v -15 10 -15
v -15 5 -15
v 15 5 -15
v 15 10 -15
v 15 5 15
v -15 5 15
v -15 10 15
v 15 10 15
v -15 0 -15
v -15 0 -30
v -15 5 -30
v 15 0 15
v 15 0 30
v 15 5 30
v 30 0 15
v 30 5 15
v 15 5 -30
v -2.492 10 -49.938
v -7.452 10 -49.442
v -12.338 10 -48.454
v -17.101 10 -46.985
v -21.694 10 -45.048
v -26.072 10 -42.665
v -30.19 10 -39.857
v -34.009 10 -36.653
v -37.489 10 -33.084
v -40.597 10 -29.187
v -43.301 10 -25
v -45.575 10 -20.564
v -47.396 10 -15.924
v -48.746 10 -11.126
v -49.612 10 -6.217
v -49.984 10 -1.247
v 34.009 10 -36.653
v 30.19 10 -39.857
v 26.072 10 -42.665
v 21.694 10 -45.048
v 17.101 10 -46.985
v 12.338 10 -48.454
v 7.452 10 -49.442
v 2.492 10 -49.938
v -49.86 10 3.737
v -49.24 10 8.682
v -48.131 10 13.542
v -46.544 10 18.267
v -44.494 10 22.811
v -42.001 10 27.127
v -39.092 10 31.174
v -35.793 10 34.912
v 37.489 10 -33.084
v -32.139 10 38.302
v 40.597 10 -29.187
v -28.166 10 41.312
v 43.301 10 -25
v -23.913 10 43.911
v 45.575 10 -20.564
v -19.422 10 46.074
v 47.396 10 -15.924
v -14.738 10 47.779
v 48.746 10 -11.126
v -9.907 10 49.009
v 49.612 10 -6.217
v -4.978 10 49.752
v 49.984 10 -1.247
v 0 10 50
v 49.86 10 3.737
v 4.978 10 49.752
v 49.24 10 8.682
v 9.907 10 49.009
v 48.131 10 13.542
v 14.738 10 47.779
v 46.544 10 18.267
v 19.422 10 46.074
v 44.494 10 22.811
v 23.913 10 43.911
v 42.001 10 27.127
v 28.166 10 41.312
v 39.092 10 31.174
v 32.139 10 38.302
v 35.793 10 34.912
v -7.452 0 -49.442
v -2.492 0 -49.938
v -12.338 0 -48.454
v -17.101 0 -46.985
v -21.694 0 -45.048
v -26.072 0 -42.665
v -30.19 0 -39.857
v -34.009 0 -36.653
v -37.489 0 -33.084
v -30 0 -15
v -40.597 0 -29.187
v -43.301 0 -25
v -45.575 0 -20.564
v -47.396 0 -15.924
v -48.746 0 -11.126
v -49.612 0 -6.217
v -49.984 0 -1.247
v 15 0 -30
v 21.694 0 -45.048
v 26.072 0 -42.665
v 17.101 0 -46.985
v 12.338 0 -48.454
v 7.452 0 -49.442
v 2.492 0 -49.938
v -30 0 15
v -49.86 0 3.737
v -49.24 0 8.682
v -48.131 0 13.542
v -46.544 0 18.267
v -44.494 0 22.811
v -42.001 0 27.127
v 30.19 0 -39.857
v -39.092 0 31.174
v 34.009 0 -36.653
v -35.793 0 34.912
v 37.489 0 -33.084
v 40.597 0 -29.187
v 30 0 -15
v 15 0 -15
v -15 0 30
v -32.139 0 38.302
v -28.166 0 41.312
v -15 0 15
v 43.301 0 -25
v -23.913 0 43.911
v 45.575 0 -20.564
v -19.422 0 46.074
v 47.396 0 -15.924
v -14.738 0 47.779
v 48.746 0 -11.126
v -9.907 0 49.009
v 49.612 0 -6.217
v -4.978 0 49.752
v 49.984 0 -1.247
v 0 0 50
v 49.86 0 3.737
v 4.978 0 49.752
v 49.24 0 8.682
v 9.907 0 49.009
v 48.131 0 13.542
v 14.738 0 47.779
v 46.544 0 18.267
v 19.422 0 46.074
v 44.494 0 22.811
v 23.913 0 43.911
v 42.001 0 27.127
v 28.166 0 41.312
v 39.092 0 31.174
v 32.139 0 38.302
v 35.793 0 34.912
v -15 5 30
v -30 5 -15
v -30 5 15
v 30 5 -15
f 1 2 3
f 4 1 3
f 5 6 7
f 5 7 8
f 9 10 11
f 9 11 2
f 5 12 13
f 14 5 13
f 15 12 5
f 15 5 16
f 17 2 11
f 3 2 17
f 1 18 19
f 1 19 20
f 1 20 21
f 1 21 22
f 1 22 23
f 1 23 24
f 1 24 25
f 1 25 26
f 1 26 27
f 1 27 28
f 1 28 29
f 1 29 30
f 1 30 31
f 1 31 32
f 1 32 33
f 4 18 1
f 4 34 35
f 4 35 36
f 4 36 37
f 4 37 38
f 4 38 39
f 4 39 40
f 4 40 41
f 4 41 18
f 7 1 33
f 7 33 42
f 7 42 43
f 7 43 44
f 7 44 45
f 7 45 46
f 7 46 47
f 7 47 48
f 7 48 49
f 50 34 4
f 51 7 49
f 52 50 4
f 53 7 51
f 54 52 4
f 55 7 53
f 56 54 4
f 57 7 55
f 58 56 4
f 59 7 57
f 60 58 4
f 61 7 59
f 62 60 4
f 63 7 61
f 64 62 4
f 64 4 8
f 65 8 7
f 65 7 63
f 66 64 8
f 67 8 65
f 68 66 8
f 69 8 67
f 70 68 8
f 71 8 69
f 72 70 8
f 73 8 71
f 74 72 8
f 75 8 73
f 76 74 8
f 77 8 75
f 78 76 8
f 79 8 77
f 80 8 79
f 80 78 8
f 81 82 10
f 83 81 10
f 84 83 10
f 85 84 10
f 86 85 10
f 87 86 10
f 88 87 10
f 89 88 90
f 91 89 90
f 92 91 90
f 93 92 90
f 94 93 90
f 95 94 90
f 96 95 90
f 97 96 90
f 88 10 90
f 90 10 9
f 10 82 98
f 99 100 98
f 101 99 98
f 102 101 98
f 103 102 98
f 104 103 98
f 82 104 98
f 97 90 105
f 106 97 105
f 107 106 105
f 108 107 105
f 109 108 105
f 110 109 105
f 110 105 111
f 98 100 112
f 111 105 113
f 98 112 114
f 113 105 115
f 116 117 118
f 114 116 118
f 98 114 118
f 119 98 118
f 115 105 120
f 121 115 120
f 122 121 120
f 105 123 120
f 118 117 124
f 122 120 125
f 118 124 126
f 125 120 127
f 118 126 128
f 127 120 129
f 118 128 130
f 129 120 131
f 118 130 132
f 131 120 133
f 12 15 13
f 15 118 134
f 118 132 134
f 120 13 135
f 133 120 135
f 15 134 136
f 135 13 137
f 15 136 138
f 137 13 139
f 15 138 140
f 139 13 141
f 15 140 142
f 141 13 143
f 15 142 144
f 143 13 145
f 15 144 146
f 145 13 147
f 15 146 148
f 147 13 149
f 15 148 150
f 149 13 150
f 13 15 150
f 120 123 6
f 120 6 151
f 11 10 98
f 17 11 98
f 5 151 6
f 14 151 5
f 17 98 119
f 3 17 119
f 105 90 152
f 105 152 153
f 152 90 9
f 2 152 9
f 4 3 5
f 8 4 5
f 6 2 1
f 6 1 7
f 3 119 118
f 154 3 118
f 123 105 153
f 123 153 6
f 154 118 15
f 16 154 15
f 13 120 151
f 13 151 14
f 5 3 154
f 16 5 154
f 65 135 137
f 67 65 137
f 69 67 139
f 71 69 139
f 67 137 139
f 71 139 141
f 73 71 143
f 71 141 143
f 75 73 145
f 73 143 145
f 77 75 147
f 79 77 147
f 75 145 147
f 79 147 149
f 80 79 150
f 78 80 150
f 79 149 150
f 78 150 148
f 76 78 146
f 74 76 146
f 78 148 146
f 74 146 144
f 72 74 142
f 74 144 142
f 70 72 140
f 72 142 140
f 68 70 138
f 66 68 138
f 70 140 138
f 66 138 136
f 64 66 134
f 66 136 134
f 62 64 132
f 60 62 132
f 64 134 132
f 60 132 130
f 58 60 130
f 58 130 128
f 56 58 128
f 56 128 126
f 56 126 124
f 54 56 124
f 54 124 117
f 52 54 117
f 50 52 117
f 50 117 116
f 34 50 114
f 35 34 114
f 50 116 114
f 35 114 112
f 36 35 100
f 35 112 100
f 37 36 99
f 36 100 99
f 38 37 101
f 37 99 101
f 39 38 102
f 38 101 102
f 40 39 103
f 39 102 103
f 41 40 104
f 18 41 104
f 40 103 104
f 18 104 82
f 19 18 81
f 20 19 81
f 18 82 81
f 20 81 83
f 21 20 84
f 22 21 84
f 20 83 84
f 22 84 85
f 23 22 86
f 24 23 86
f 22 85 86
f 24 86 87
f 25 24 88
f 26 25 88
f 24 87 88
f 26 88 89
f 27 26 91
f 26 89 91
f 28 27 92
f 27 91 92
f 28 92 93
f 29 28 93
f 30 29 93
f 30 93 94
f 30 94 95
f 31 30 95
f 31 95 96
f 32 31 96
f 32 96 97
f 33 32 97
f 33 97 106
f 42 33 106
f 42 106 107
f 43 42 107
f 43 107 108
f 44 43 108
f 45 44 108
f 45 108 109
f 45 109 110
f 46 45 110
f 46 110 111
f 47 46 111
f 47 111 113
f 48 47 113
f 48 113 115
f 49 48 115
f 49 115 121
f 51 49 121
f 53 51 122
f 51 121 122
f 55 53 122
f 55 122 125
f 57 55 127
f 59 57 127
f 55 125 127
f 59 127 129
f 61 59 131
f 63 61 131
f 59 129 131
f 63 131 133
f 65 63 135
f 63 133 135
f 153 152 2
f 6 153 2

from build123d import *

# Parameters (mm, degrees)
SKETCH2_R           = 50
BOSS_EXTRUDE1_DEPTH = 10
SKETCH4_W           = 30
SKETCH4_H           = 30
CUT_EXTRUDE4_DEPTH  = 72.414284285
SKETCH4_5_W         = 30
SKETCH4_5_H         = 15
SKETCH4_5_W_2       = 15
SKETCH4_5_H_2       = 30
CUT_EXTRUDE5_DEPTH  = 5


with BuildPart() as part:
    # Sketch2 → Boss-Extrude1 (new body)
    with BuildSketch(Plane(origin=(0, 0, 0), x_dir=(1, 0, 0), z_dir=(0, 1, 0))):
        Circle(SKETCH2_R)
    extrude(amount=BOSS_EXTRUDE1_DEPTH)

    # Sketch4 → Cut-Extrude4 (cut, through all)
    with BuildSketch(Plane.XZ):
        Rectangle(SKETCH4_W, SKETCH4_H)
    extrude(amount=-CUT_EXTRUDE4_DEPTH, mode=Mode.SUBTRACT)

    # Sketch4<5> → Cut-Extrude5 (cut)
    with BuildSketch(Plane.XZ):
        with Locations((0, 22.5)):
            Rectangle(SKETCH4_5_W, SKETCH4_5_H)
        with Locations((-22.5, 0)):
            Rectangle(SKETCH4_5_W_2, SKETCH4_5_H_2)
        with Locations((22.5, 0)):
            Rectangle(SKETCH4_5_W_2, SKETCH4_5_H_2)
        with Locations((0, -22.5)):
            Rectangle(SKETCH4_5_W, SKETCH4_5_H)
    extrude(amount=-CUT_EXTRUDE5_DEPTH, mode=Mode.SUBTRACT)


solid = part.part
